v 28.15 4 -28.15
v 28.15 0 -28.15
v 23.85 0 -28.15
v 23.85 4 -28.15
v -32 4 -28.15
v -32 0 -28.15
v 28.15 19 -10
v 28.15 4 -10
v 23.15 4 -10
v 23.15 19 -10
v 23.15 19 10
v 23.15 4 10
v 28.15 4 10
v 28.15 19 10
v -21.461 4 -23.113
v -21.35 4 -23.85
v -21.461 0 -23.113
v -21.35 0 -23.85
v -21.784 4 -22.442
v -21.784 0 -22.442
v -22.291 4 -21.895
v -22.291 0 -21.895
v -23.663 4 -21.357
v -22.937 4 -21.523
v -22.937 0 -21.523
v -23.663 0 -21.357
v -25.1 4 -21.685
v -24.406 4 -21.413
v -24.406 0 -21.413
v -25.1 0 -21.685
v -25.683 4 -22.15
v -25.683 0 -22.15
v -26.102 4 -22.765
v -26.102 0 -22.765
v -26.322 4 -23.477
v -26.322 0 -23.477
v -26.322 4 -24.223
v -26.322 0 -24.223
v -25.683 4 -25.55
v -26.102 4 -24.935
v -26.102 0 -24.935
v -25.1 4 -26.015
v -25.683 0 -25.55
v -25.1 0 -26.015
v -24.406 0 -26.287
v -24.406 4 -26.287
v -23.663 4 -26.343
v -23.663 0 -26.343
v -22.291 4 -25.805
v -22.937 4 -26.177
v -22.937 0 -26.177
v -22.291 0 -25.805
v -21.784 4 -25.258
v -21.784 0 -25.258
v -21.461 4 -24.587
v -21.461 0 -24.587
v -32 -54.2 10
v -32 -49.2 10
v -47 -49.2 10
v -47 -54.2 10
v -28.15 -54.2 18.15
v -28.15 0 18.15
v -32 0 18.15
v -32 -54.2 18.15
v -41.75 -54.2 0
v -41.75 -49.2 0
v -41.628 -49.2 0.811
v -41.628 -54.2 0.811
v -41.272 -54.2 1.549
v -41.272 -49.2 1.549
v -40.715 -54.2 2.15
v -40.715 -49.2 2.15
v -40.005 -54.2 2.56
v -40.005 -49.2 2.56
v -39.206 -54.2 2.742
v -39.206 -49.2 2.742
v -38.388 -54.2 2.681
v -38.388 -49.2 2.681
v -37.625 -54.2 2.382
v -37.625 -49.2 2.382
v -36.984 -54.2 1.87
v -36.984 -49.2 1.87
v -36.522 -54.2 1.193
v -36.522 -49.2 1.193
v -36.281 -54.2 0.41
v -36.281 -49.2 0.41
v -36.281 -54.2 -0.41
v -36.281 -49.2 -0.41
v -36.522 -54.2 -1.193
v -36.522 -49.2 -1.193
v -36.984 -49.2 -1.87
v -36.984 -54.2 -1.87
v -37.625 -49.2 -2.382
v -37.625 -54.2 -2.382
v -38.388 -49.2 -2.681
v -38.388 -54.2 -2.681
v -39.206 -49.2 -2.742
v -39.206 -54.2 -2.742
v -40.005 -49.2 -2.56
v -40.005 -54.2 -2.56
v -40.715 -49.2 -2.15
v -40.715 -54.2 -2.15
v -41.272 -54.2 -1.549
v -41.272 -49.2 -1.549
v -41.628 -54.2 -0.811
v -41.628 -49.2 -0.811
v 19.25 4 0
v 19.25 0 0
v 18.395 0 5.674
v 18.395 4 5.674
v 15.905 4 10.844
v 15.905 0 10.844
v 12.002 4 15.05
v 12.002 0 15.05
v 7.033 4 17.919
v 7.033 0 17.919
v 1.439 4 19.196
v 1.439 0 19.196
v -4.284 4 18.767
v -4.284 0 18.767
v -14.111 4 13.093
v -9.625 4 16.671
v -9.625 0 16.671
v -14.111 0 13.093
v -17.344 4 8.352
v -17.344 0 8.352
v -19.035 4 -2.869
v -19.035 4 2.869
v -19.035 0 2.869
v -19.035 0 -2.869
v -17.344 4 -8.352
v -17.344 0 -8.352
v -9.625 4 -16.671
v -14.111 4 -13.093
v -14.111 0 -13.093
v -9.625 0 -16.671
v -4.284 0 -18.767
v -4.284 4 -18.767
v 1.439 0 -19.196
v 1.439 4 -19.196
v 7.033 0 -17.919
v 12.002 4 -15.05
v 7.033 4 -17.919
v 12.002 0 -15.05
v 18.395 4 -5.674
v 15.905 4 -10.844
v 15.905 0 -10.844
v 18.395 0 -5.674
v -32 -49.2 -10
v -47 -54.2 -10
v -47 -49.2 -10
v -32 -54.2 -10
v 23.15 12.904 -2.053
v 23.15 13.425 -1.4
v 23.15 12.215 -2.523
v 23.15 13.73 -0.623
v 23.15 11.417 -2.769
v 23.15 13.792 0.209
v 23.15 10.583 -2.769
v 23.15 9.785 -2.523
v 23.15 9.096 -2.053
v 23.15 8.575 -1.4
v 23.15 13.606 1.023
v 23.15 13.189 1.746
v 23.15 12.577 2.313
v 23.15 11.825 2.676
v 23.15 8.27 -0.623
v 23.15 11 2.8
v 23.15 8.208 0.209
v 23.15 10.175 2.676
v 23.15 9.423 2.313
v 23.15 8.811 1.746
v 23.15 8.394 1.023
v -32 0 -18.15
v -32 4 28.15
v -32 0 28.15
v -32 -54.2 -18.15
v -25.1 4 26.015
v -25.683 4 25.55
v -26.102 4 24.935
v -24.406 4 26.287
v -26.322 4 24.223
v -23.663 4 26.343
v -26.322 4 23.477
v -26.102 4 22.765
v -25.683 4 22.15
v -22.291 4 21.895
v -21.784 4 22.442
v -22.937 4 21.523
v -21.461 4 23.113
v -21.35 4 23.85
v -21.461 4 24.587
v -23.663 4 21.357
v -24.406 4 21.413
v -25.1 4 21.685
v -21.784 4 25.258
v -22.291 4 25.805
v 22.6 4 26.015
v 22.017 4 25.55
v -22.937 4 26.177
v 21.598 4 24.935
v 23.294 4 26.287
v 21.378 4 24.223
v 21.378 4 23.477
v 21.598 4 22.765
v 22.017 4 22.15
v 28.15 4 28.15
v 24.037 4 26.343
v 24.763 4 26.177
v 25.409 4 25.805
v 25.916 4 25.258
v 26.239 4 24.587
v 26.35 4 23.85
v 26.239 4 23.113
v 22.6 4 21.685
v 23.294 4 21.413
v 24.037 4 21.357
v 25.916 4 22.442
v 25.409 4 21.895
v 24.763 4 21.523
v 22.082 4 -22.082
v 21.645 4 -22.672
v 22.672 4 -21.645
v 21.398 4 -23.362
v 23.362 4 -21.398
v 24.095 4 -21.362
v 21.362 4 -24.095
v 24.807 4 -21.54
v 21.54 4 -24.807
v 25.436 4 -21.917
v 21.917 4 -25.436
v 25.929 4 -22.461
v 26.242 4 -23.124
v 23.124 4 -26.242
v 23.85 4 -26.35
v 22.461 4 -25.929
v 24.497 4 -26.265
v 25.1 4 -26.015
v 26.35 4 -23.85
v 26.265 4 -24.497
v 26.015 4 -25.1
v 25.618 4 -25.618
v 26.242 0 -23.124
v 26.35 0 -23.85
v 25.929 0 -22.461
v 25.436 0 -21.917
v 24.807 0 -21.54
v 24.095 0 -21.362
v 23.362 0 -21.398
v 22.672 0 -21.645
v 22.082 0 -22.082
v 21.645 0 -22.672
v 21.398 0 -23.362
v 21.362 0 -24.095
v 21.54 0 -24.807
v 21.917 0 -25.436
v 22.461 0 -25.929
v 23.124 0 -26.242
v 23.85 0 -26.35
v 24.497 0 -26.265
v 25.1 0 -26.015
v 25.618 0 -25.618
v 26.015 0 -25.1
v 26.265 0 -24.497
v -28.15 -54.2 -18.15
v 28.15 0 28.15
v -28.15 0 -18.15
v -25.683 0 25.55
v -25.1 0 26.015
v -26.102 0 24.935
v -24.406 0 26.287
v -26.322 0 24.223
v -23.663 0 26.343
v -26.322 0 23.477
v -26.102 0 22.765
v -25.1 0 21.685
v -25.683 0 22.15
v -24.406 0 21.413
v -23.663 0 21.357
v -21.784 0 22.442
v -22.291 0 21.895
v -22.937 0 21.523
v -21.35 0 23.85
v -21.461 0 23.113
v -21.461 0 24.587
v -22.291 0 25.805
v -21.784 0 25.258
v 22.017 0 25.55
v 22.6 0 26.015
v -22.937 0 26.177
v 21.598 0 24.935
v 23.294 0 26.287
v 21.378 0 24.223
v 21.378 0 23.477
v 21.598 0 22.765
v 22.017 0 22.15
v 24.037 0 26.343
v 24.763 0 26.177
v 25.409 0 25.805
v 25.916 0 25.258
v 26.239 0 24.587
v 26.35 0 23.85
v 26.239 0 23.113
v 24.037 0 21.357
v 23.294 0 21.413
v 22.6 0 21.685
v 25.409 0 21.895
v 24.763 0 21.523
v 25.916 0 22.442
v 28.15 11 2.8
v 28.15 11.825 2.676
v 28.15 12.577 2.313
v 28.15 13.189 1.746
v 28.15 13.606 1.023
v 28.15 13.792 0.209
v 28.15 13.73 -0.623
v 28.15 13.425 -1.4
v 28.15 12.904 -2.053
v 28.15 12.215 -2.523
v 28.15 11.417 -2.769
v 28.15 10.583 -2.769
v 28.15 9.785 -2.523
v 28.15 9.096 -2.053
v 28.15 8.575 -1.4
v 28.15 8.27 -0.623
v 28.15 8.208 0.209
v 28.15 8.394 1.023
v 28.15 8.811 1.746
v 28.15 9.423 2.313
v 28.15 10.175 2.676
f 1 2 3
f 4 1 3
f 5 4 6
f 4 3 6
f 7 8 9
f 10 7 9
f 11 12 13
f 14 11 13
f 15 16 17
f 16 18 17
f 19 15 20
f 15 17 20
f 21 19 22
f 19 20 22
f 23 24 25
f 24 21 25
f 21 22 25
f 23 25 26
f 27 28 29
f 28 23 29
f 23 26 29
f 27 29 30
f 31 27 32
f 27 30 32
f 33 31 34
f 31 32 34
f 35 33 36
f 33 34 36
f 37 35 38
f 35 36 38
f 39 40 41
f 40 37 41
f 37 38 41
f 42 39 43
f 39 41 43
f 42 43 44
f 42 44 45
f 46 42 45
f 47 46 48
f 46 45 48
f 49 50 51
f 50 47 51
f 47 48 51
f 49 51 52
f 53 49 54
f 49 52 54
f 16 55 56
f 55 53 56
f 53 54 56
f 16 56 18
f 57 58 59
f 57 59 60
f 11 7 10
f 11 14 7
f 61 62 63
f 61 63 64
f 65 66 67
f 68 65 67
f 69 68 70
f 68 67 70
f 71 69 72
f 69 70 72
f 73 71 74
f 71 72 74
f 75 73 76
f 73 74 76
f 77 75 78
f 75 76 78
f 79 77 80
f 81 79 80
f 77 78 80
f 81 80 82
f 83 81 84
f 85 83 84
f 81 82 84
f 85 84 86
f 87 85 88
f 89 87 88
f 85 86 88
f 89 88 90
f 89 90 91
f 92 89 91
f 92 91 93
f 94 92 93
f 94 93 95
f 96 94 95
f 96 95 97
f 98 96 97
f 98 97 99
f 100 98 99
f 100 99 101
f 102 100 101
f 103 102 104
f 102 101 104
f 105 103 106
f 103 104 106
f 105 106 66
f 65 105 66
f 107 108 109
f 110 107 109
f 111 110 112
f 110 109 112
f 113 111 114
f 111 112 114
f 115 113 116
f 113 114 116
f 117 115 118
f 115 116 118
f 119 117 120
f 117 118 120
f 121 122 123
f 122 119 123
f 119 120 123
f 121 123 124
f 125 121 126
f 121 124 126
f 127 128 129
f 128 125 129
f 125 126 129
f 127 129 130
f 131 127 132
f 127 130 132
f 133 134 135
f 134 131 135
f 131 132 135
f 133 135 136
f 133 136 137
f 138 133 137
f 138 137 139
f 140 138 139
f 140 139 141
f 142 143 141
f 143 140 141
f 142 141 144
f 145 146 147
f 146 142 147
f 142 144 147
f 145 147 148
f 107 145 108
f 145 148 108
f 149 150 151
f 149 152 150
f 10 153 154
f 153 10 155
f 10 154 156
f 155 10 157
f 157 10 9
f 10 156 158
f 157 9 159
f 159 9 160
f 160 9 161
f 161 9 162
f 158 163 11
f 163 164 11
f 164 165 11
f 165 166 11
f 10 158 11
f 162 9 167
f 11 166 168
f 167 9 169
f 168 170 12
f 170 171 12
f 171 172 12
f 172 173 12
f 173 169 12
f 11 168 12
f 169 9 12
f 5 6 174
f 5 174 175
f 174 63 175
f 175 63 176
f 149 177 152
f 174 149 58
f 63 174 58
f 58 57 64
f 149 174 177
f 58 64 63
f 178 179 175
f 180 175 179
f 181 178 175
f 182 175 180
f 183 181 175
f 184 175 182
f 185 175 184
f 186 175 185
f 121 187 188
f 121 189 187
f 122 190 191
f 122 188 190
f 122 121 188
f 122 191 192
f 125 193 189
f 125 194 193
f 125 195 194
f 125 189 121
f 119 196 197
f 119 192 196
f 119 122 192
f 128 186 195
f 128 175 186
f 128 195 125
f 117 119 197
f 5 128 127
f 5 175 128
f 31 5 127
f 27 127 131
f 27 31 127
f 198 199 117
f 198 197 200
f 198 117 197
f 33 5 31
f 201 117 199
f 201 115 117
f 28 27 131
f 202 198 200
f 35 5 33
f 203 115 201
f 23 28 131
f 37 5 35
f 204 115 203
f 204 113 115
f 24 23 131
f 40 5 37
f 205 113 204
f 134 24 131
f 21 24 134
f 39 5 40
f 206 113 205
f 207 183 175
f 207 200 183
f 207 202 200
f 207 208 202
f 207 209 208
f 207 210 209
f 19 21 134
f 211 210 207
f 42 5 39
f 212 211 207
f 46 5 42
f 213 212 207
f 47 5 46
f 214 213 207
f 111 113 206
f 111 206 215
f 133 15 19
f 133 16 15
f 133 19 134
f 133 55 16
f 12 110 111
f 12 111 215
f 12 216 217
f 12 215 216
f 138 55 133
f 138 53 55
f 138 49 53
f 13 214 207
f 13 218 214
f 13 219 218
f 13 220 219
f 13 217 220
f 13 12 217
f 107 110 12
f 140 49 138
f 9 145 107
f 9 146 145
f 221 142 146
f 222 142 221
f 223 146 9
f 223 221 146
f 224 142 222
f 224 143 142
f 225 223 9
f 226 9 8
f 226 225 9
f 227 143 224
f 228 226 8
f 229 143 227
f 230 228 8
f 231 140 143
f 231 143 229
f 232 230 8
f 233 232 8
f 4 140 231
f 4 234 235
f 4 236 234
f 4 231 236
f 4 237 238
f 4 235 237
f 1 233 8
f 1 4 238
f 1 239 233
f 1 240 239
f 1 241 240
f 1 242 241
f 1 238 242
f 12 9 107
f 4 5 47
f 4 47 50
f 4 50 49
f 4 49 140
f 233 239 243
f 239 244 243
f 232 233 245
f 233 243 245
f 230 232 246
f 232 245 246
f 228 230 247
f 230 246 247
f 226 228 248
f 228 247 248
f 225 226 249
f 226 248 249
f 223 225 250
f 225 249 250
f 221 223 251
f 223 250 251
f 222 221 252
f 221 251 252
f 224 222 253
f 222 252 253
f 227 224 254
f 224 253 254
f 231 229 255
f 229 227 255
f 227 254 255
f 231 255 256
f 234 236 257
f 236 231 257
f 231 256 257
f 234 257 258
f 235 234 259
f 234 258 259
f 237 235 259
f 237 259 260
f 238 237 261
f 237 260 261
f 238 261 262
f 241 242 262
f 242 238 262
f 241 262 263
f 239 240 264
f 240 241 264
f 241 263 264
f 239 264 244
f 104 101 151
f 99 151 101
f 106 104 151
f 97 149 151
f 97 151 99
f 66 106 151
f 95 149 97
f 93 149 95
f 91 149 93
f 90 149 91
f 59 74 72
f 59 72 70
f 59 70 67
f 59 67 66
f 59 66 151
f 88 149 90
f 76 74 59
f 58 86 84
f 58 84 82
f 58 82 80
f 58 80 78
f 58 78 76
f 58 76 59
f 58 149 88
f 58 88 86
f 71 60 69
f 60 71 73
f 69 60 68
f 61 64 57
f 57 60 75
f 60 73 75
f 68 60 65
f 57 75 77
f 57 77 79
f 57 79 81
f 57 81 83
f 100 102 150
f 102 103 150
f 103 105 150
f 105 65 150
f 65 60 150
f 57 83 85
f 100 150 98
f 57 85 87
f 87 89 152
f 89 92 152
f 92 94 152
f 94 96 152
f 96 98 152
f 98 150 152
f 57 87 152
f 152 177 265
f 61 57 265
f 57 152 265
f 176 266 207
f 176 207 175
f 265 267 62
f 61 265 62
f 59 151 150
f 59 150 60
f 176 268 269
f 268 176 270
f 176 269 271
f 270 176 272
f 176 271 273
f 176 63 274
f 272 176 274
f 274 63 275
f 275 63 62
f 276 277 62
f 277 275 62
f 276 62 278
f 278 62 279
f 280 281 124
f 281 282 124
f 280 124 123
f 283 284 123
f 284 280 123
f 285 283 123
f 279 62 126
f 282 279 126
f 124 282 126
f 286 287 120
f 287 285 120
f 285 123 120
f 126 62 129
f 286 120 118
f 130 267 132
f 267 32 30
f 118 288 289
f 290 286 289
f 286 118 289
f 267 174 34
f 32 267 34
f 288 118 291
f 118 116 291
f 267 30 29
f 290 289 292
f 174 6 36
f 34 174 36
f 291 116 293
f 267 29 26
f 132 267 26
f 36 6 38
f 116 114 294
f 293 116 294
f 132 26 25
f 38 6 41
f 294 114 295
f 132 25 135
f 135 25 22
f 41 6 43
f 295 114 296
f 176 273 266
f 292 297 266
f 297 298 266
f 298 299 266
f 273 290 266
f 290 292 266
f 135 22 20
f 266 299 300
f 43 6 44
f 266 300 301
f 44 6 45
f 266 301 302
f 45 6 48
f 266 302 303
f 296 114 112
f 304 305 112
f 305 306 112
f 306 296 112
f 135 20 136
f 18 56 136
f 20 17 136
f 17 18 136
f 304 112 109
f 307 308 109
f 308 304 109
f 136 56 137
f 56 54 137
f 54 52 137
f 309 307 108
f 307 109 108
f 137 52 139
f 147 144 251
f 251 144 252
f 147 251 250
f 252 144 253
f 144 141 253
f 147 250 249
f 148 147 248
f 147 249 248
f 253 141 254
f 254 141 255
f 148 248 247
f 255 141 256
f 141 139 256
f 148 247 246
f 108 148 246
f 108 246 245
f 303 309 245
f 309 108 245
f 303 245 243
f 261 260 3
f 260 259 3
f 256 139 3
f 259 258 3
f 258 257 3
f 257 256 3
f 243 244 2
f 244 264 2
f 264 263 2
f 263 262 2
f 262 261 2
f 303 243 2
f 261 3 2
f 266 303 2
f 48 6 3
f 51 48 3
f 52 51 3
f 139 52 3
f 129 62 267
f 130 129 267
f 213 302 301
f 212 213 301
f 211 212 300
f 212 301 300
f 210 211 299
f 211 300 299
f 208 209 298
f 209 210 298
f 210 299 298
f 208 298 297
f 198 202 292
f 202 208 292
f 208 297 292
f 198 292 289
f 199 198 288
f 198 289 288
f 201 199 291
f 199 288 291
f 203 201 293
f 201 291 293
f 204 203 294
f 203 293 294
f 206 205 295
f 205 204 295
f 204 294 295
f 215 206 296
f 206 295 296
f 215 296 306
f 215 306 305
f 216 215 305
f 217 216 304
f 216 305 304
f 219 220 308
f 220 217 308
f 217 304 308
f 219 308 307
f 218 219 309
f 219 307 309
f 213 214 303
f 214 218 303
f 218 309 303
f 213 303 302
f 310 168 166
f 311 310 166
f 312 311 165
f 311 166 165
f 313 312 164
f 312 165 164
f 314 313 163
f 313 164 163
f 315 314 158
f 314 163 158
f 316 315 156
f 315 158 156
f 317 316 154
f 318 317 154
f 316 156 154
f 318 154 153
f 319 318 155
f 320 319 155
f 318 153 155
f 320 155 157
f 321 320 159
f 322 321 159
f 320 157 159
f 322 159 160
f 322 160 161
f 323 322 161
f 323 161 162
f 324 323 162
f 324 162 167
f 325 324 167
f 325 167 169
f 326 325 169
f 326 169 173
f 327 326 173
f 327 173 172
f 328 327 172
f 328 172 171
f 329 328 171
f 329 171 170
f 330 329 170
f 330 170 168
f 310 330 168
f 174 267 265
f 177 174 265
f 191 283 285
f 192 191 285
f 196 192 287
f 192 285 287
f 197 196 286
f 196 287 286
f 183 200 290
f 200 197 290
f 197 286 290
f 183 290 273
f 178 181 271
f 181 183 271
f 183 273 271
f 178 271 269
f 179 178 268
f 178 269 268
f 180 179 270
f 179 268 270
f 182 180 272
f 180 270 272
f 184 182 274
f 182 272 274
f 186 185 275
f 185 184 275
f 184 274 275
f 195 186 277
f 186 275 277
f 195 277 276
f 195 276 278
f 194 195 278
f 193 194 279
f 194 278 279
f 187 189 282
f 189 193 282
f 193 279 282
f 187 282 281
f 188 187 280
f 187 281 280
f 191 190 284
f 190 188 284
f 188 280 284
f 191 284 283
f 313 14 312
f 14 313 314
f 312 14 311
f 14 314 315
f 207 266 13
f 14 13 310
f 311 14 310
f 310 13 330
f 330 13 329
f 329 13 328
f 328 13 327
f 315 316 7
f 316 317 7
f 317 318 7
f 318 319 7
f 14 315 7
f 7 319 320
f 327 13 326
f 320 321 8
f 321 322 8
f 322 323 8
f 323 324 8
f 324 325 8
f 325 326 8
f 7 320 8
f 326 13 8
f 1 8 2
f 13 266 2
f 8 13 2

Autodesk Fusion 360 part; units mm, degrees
sketch "Sketch1" plane through (0, 0, 0) normal (0, 1, 0) x (1, 0, 0)
  line L0 (28.15, 28.15) -> (-28.15, 28.15)
  line L1 (-28.15, 28.15) -> (-28.15, -28.15)
  line L2 (-28.15, -28.15) -> (28.15, -28.15)
  line L3 (28.15, -28.15) -> (28.15, 28.15)
  line L4 (28.15, 28.15) -> (-28.15, -28.15) construction
  line L5 (-28.15, 28.15) -> (28.15, -28.15) construction
  line L6 (28.15, 28.15) -> (23.85, 28.15)
  line L7 (23.85, 28.15) -> (23.85, 23.85)
  circle A0 centre (23.85, 23.85) radius 2.5
  circle A1 centre (-23.85, 23.85) radius 2.5
  circle A2 centre (-23.85, -23.85) radius 2.5
  circle A3 centre (23.85, -23.85) radius 2.5
  line L8 (32, 32) -> (-32, 32)
  line L9 (-32, 32) -> (-32, -32)
  line L10 (-32, -32) -> (32, -32)
  line L11 (32, -32) -> (32, 32)
  line L12 (32, 32) -> (-32, -32) construction
  line L13 (-32, 32) -> (32, -32) construction
  circle A4 centre (0, 0) radius 19.25
  dimension "d1" = 56.3
  dimension "d2" = 56.3
  dimension "d3" = 4.3
  dimension "d4" = 4.3
  dimension "d5" = 5
  dimension "d7" = 360
  dimension "d8" = 64
  dimension "d9" = 38.5
extrude "Extrude1" add sketch "Sketch1" along normal blind 4 contours L0 L1 L2 L3 L6 | L8 L9 L10 L11
sketch "Sketch2" plane through (0, 0, 0) normal (0, 1, 0) x (1, 0, 0)
  circle A0 centre (-23.85, 23.85) radius 2.5
  circle A1 centre (23.85, 23.85) radius 2.5
  circle A2 centre (0, 0) radius 19.25
  circle A3 centre (23.85, -23.85) radius 2.5
  circle A4 centre (-23.85, -23.85) radius 2.5
  line L0 (32, 32) -> (32, -32)
  line L1 (32, -32) -> (-32, -32)
  line L2 (-32, -32) -> (-32, 32)
  line L3 (-32, 32) -> (32, 32)
  line L4 (-28.15, 28.15) -> (-28.15, -28.15)
  line L5 (-32, 32) -> (-32, -32)
  line L6 (-28.15, -28.15) -> (-32, -28.15)
  line L7 (-28.15, 28.15) -> (-32, 28.15)
extrude "Extrude2" add sketch "Sketch2" against normal blind 54.2 contours L2 L4 L5 L6 L7
sketch "Sketch3" plane through (-32, 0, 0) normal (-1, 0, 0) x (0, 0, 1)
  line L0 (-32, 0) -> (-28.15, 0)
  line L1 (-28.15, 0) -> (-28.15, -54.2)
  line L2 (-28.15, -54.2) -> (28.15, -54.2)
  line L3 (28.15, -54.2) -> (28.15, 0)
  line L4 (28.15, 0) -> (32, 0)
  line L5 (32, 0) -> (32, 4)
  line L6 (32, 4) -> (-32, 4)
  line L7 (-32, 4) -> (-32, 0)
  line L8 (0, -54.2) -> (10, -54.2)
  line L9 (10, -54.2) -> (-10, -54.2)
  line L10 (-10, -54.2) -> (-10, -49.2)
  line L11 (-10, -49.2) -> (10, -49.2)
  line L12 (10, -49.2) -> (10, -54.2)
  dimension "d14" = 10
  dimension "d15" = 20
  dimension "d16" = 5
extrude "Extrude3" add sketch "Sketch3" along normal blind 15 contours L2 L8 L9 L10 L11 L12
sketch "Sketch4" plane through (0, -49.2, 0) normal (0, 1, 0) x (-1, 0, 0)
  line L0 (32, 10) -> (32, -10)
  line L1 (32, -10) -> (47, -10)
  line L2 (47, -10) -> (47, 10)
  line L3 (47, 10) -> (32, 10)
  line L4 (32, 0) -> (39, 0)
  circle A0 centre (39, 0) radius 2.75
  dimension "d19" = 7
  dimension "d20" = 5.5
extrude "Extrude4" cut sketch "Sketch4" against normal blind 19 contours A0
extrude "Extrude7" cut sketch "Sketch1" along normal blind 5 contours L8 L9 L10 L11
sketch "Sketch7" plane through (0, 0, 0) normal (0, 1, 0) x (1, 0, 0)
  line L0 (-28.15, 28.15) -> (-28.15, -28.15)
  line L1 (-28.15, -28.15) -> (28.15, -28.15)
  line L2 (28.15, -28.15) -> (28.15, 28.15)
  line L3 (28.15, 28.15) -> (-28.15, 28.15)
  circle A0 centre (-23.85, 23.85) radius 2.5
  circle A1 centre (23.85, 23.85) radius 2.5
  circle A2 centre (0, 0) radius 19.25
  circle A3 centre (23.85, -23.85) radius 2.5
  circle A4 centre (-23.85, -23.85) radius 2.5
  line L4 (-28.15, -28.15) -> (-32, -28.15)
  line L5 (-28.15, 28.15) -> (-32, 28.15)
  line L6 (-32, 28.15) -> (-32, -28.15)
  line L7 (-28.15, -28.15) -> (-28.15, 28.15)
extrude "Extrude8" add sketch "Sketch7" along normal blind 4 contours L0 L4 L5 L6 L7
sketch "Sketch8" plane through (-28.15, 0, 0) normal (1, 0, 0) x (0, 0, -1)
  line L0 (28.15, 0) -> (-28.15, 0)
  line L1 (-28.15, 0) -> (-28.15, -54.2)
  line L2 (-28.15, -54.2) -> (28.15, -54.2)
  line L3 (28.15, -54.2) -> (28.15, 0)
  line L4 (-28.15, -54.2) -> (-18.15, -54.2)
  line L5 (-18.15, -54.2) -> (-28.15, -54.2)
  line L6 (-28.15, -54.2) -> (-28.15, 0)
  line L7 (-28.15, 0) -> (-18.15, 0)
  line L8 (-18.15, 0) -> (-18.15, -54.2)
  line L9 (28.15, -54.2) -> (18.15, -54.2)
  line L10 (18.15, -54.2) -> (28.15, -54.2)
  line L11 (28.15, -54.2) -> (28.15, 0)
  line L12 (28.15, 0) -> (18.15, 0)
  line L13 (18.15, 0) -> (18.15, -54.2)
  dimension "d36" = 10
  dimension "d37" = 10
extrude "Extrude9" cut sketch "Sketch8" against normal blind 4 contours L0 L2 L3 L9 L10 L11 L12 L13 | L0 L1 L2 L4 L5 L6 L7 L8
sketch "Sketch9" plane through (0, 4, 0) normal (0, 1, 0) x (-1, 0, 0)
  line L0 (32, 28.15) -> (-28.15, 28.15)
  line L1 (-28.15, 28.15) -> (-28.15, -28.15)
  line L2 (-28.15, -28.15) -> (32, -28.15)
  line L3 (32, -28.15) -> (32, 28.15)
  circle A0 centre (23.85, -23.85) radius 2.5
  circle A1 centre (-23.85, -23.85) radius 2.5
  circle A2 centre (0, 0) radius 19.25
  circle A3 centre (-23.85, 23.85) radius 2.5
  circle A4 centre (23.85, 23.85) radius 2.5
  line L4 (-28.15, 0) -> (-28.15, -10)
  line L5 (-28.15, -10) -> (-23.15, -10)
  line L6 (-23.15, -10) -> (-23.15, 10)
  line L7 (-23.15, 10) -> (-28.15, 10)
  line L8 (-28.15, 10) -> (-28.15, -10)
  dimension "d40" = 10
  dimension "d41" = 5
  dimension "d42" = 20
extrude "Extrude10" add sketch "Sketch9" along normal blind 15 contours L1 L4 L5 L6 L7 L8
sketch "Sketch10" plane through (23.15, 0, 0) normal (-1, 0, 0) x (0, 0, 1)
  line L0 (-10, 4) -> (10, 4)
  line L1 (10, 4) -> (10, 19)
  line L2 (10, 19) -> (-10, 19)
  line L3 (-10, 19) -> (-10, 4)
  line L4 (0, 4) -> (0, 11)
  circle A0 centre (0, 11) radius 2.8
  dimension "d45" = 7
  dimension "d46" = 5.6
extrude "Extrude11" cut sketch "Sketch10" against normal blind 13 contours A0
